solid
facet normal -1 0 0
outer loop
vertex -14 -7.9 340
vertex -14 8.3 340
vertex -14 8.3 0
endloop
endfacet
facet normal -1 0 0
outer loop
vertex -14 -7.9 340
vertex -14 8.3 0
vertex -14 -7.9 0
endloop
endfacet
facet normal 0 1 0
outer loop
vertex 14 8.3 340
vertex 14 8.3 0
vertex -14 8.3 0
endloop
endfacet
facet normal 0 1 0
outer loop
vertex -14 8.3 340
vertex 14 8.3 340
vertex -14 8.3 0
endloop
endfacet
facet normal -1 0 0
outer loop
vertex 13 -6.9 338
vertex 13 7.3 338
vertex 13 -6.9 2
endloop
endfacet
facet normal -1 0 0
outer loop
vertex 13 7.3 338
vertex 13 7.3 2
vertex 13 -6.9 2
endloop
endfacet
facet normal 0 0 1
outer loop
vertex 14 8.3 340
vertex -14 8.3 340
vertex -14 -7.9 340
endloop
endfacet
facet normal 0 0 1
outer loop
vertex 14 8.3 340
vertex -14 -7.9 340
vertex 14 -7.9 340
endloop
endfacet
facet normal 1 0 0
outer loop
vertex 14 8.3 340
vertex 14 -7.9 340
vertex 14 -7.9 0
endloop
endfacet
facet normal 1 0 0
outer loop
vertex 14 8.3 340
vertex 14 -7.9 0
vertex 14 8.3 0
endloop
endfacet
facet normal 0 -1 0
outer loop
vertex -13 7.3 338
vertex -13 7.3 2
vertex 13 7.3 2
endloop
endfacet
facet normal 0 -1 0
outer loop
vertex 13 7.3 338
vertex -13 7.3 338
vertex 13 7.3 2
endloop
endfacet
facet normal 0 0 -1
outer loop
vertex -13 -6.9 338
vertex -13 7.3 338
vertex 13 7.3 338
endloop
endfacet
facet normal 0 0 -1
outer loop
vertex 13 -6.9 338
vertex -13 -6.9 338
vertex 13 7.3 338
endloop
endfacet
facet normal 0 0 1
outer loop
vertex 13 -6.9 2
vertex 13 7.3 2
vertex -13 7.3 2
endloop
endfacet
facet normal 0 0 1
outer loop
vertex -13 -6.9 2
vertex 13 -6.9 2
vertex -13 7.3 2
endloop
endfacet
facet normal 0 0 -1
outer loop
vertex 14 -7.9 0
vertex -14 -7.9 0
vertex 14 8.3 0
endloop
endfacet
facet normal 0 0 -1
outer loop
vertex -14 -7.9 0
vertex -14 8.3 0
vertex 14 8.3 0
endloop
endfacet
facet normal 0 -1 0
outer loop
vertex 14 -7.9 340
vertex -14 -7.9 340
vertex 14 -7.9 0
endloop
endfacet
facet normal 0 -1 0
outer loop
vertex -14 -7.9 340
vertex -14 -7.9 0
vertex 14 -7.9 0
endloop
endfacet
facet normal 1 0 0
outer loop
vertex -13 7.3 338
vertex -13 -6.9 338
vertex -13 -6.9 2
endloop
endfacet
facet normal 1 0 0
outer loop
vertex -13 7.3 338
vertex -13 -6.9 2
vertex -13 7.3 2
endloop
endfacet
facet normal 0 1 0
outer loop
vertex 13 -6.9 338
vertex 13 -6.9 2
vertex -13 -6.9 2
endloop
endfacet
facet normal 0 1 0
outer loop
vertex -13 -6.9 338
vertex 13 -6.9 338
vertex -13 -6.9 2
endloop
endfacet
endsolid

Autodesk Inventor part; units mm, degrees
ref_plane "YZ Plane" through (0, 0, 0) normal (1, 0, 0) x (0, 1, 0)
ref_plane "XZ Plane" through (0, 0, 0) normal (0, 1, 0) x (-1, 0, 0)
ref_plane "XY Plane" through (0, 0, 0) normal (0, 0, 1) x (1, 0, 0)
sketch "Sketch1" plane through (0, 0, 0) normal (0, 0, 1) x (1, 0, 0)
  line L0 (-14, -7.9) -> (14, -7.9)
  line L1 (14, -7.9) -> (14, 8.3)
  line L2 (14, 8.3) -> (-14, 8.3)
  line L3 (-14, 8.3) -> (-14, -7.9)
  line L4 (-13, 7.3) -> (13, 7.3)
  line L5 (13, 7.3) -> (13, -6.9)
  line L6 (13, -6.9) -> (-13, -6.9)
  line L7 (-13, -6.9) -> (-13, 7.3)
  dimension "d2" = 1
extrude "Extrusion1" add sketch "Sketch1" along normal blind 340
sketch "Sketch2" plane through (0, 0, 340) normal (0, 0, 1) x (1, 0, 0)
  line L0 (14, 8.3) -> (-14, 8.3) construction
  line L1 (14, -7.9) -> (14, 8.3) construction
  line L2 (-14, 8.3) -> (14, 8.3)
  line L3 (14, 8.3) -> (14, -7.9)
  line L4 (14, -7.9) -> (-14, -7.9)
  line L5 (-14, -7.9) -> (-14, 8.3)
  point P0 (0, 0)
extrude "Extrusion2" add sketch "Sketch2" against normal blind 2
sketch "Sketch3" plane through (0, 0, 0) normal (0, 0, -1) x (-1, 0, 0)
  line L0 (14, -7.9) -> (-14, -7.9) construction
  line L1 (14, -7.9) -> (-14, -7.9)
  line L2 (-14, -7.9) -> (-14, 8.3)
  line L3 (-14, 8.3) -> (14, 8.3)
  line L4 (14, 8.3) -> (14, -7.9)
  point P0 (0, 0)
extrude "Extrusion3" add sketch "Sketch3" against normal blind 2
properties part number "PL_rod_duoble"
